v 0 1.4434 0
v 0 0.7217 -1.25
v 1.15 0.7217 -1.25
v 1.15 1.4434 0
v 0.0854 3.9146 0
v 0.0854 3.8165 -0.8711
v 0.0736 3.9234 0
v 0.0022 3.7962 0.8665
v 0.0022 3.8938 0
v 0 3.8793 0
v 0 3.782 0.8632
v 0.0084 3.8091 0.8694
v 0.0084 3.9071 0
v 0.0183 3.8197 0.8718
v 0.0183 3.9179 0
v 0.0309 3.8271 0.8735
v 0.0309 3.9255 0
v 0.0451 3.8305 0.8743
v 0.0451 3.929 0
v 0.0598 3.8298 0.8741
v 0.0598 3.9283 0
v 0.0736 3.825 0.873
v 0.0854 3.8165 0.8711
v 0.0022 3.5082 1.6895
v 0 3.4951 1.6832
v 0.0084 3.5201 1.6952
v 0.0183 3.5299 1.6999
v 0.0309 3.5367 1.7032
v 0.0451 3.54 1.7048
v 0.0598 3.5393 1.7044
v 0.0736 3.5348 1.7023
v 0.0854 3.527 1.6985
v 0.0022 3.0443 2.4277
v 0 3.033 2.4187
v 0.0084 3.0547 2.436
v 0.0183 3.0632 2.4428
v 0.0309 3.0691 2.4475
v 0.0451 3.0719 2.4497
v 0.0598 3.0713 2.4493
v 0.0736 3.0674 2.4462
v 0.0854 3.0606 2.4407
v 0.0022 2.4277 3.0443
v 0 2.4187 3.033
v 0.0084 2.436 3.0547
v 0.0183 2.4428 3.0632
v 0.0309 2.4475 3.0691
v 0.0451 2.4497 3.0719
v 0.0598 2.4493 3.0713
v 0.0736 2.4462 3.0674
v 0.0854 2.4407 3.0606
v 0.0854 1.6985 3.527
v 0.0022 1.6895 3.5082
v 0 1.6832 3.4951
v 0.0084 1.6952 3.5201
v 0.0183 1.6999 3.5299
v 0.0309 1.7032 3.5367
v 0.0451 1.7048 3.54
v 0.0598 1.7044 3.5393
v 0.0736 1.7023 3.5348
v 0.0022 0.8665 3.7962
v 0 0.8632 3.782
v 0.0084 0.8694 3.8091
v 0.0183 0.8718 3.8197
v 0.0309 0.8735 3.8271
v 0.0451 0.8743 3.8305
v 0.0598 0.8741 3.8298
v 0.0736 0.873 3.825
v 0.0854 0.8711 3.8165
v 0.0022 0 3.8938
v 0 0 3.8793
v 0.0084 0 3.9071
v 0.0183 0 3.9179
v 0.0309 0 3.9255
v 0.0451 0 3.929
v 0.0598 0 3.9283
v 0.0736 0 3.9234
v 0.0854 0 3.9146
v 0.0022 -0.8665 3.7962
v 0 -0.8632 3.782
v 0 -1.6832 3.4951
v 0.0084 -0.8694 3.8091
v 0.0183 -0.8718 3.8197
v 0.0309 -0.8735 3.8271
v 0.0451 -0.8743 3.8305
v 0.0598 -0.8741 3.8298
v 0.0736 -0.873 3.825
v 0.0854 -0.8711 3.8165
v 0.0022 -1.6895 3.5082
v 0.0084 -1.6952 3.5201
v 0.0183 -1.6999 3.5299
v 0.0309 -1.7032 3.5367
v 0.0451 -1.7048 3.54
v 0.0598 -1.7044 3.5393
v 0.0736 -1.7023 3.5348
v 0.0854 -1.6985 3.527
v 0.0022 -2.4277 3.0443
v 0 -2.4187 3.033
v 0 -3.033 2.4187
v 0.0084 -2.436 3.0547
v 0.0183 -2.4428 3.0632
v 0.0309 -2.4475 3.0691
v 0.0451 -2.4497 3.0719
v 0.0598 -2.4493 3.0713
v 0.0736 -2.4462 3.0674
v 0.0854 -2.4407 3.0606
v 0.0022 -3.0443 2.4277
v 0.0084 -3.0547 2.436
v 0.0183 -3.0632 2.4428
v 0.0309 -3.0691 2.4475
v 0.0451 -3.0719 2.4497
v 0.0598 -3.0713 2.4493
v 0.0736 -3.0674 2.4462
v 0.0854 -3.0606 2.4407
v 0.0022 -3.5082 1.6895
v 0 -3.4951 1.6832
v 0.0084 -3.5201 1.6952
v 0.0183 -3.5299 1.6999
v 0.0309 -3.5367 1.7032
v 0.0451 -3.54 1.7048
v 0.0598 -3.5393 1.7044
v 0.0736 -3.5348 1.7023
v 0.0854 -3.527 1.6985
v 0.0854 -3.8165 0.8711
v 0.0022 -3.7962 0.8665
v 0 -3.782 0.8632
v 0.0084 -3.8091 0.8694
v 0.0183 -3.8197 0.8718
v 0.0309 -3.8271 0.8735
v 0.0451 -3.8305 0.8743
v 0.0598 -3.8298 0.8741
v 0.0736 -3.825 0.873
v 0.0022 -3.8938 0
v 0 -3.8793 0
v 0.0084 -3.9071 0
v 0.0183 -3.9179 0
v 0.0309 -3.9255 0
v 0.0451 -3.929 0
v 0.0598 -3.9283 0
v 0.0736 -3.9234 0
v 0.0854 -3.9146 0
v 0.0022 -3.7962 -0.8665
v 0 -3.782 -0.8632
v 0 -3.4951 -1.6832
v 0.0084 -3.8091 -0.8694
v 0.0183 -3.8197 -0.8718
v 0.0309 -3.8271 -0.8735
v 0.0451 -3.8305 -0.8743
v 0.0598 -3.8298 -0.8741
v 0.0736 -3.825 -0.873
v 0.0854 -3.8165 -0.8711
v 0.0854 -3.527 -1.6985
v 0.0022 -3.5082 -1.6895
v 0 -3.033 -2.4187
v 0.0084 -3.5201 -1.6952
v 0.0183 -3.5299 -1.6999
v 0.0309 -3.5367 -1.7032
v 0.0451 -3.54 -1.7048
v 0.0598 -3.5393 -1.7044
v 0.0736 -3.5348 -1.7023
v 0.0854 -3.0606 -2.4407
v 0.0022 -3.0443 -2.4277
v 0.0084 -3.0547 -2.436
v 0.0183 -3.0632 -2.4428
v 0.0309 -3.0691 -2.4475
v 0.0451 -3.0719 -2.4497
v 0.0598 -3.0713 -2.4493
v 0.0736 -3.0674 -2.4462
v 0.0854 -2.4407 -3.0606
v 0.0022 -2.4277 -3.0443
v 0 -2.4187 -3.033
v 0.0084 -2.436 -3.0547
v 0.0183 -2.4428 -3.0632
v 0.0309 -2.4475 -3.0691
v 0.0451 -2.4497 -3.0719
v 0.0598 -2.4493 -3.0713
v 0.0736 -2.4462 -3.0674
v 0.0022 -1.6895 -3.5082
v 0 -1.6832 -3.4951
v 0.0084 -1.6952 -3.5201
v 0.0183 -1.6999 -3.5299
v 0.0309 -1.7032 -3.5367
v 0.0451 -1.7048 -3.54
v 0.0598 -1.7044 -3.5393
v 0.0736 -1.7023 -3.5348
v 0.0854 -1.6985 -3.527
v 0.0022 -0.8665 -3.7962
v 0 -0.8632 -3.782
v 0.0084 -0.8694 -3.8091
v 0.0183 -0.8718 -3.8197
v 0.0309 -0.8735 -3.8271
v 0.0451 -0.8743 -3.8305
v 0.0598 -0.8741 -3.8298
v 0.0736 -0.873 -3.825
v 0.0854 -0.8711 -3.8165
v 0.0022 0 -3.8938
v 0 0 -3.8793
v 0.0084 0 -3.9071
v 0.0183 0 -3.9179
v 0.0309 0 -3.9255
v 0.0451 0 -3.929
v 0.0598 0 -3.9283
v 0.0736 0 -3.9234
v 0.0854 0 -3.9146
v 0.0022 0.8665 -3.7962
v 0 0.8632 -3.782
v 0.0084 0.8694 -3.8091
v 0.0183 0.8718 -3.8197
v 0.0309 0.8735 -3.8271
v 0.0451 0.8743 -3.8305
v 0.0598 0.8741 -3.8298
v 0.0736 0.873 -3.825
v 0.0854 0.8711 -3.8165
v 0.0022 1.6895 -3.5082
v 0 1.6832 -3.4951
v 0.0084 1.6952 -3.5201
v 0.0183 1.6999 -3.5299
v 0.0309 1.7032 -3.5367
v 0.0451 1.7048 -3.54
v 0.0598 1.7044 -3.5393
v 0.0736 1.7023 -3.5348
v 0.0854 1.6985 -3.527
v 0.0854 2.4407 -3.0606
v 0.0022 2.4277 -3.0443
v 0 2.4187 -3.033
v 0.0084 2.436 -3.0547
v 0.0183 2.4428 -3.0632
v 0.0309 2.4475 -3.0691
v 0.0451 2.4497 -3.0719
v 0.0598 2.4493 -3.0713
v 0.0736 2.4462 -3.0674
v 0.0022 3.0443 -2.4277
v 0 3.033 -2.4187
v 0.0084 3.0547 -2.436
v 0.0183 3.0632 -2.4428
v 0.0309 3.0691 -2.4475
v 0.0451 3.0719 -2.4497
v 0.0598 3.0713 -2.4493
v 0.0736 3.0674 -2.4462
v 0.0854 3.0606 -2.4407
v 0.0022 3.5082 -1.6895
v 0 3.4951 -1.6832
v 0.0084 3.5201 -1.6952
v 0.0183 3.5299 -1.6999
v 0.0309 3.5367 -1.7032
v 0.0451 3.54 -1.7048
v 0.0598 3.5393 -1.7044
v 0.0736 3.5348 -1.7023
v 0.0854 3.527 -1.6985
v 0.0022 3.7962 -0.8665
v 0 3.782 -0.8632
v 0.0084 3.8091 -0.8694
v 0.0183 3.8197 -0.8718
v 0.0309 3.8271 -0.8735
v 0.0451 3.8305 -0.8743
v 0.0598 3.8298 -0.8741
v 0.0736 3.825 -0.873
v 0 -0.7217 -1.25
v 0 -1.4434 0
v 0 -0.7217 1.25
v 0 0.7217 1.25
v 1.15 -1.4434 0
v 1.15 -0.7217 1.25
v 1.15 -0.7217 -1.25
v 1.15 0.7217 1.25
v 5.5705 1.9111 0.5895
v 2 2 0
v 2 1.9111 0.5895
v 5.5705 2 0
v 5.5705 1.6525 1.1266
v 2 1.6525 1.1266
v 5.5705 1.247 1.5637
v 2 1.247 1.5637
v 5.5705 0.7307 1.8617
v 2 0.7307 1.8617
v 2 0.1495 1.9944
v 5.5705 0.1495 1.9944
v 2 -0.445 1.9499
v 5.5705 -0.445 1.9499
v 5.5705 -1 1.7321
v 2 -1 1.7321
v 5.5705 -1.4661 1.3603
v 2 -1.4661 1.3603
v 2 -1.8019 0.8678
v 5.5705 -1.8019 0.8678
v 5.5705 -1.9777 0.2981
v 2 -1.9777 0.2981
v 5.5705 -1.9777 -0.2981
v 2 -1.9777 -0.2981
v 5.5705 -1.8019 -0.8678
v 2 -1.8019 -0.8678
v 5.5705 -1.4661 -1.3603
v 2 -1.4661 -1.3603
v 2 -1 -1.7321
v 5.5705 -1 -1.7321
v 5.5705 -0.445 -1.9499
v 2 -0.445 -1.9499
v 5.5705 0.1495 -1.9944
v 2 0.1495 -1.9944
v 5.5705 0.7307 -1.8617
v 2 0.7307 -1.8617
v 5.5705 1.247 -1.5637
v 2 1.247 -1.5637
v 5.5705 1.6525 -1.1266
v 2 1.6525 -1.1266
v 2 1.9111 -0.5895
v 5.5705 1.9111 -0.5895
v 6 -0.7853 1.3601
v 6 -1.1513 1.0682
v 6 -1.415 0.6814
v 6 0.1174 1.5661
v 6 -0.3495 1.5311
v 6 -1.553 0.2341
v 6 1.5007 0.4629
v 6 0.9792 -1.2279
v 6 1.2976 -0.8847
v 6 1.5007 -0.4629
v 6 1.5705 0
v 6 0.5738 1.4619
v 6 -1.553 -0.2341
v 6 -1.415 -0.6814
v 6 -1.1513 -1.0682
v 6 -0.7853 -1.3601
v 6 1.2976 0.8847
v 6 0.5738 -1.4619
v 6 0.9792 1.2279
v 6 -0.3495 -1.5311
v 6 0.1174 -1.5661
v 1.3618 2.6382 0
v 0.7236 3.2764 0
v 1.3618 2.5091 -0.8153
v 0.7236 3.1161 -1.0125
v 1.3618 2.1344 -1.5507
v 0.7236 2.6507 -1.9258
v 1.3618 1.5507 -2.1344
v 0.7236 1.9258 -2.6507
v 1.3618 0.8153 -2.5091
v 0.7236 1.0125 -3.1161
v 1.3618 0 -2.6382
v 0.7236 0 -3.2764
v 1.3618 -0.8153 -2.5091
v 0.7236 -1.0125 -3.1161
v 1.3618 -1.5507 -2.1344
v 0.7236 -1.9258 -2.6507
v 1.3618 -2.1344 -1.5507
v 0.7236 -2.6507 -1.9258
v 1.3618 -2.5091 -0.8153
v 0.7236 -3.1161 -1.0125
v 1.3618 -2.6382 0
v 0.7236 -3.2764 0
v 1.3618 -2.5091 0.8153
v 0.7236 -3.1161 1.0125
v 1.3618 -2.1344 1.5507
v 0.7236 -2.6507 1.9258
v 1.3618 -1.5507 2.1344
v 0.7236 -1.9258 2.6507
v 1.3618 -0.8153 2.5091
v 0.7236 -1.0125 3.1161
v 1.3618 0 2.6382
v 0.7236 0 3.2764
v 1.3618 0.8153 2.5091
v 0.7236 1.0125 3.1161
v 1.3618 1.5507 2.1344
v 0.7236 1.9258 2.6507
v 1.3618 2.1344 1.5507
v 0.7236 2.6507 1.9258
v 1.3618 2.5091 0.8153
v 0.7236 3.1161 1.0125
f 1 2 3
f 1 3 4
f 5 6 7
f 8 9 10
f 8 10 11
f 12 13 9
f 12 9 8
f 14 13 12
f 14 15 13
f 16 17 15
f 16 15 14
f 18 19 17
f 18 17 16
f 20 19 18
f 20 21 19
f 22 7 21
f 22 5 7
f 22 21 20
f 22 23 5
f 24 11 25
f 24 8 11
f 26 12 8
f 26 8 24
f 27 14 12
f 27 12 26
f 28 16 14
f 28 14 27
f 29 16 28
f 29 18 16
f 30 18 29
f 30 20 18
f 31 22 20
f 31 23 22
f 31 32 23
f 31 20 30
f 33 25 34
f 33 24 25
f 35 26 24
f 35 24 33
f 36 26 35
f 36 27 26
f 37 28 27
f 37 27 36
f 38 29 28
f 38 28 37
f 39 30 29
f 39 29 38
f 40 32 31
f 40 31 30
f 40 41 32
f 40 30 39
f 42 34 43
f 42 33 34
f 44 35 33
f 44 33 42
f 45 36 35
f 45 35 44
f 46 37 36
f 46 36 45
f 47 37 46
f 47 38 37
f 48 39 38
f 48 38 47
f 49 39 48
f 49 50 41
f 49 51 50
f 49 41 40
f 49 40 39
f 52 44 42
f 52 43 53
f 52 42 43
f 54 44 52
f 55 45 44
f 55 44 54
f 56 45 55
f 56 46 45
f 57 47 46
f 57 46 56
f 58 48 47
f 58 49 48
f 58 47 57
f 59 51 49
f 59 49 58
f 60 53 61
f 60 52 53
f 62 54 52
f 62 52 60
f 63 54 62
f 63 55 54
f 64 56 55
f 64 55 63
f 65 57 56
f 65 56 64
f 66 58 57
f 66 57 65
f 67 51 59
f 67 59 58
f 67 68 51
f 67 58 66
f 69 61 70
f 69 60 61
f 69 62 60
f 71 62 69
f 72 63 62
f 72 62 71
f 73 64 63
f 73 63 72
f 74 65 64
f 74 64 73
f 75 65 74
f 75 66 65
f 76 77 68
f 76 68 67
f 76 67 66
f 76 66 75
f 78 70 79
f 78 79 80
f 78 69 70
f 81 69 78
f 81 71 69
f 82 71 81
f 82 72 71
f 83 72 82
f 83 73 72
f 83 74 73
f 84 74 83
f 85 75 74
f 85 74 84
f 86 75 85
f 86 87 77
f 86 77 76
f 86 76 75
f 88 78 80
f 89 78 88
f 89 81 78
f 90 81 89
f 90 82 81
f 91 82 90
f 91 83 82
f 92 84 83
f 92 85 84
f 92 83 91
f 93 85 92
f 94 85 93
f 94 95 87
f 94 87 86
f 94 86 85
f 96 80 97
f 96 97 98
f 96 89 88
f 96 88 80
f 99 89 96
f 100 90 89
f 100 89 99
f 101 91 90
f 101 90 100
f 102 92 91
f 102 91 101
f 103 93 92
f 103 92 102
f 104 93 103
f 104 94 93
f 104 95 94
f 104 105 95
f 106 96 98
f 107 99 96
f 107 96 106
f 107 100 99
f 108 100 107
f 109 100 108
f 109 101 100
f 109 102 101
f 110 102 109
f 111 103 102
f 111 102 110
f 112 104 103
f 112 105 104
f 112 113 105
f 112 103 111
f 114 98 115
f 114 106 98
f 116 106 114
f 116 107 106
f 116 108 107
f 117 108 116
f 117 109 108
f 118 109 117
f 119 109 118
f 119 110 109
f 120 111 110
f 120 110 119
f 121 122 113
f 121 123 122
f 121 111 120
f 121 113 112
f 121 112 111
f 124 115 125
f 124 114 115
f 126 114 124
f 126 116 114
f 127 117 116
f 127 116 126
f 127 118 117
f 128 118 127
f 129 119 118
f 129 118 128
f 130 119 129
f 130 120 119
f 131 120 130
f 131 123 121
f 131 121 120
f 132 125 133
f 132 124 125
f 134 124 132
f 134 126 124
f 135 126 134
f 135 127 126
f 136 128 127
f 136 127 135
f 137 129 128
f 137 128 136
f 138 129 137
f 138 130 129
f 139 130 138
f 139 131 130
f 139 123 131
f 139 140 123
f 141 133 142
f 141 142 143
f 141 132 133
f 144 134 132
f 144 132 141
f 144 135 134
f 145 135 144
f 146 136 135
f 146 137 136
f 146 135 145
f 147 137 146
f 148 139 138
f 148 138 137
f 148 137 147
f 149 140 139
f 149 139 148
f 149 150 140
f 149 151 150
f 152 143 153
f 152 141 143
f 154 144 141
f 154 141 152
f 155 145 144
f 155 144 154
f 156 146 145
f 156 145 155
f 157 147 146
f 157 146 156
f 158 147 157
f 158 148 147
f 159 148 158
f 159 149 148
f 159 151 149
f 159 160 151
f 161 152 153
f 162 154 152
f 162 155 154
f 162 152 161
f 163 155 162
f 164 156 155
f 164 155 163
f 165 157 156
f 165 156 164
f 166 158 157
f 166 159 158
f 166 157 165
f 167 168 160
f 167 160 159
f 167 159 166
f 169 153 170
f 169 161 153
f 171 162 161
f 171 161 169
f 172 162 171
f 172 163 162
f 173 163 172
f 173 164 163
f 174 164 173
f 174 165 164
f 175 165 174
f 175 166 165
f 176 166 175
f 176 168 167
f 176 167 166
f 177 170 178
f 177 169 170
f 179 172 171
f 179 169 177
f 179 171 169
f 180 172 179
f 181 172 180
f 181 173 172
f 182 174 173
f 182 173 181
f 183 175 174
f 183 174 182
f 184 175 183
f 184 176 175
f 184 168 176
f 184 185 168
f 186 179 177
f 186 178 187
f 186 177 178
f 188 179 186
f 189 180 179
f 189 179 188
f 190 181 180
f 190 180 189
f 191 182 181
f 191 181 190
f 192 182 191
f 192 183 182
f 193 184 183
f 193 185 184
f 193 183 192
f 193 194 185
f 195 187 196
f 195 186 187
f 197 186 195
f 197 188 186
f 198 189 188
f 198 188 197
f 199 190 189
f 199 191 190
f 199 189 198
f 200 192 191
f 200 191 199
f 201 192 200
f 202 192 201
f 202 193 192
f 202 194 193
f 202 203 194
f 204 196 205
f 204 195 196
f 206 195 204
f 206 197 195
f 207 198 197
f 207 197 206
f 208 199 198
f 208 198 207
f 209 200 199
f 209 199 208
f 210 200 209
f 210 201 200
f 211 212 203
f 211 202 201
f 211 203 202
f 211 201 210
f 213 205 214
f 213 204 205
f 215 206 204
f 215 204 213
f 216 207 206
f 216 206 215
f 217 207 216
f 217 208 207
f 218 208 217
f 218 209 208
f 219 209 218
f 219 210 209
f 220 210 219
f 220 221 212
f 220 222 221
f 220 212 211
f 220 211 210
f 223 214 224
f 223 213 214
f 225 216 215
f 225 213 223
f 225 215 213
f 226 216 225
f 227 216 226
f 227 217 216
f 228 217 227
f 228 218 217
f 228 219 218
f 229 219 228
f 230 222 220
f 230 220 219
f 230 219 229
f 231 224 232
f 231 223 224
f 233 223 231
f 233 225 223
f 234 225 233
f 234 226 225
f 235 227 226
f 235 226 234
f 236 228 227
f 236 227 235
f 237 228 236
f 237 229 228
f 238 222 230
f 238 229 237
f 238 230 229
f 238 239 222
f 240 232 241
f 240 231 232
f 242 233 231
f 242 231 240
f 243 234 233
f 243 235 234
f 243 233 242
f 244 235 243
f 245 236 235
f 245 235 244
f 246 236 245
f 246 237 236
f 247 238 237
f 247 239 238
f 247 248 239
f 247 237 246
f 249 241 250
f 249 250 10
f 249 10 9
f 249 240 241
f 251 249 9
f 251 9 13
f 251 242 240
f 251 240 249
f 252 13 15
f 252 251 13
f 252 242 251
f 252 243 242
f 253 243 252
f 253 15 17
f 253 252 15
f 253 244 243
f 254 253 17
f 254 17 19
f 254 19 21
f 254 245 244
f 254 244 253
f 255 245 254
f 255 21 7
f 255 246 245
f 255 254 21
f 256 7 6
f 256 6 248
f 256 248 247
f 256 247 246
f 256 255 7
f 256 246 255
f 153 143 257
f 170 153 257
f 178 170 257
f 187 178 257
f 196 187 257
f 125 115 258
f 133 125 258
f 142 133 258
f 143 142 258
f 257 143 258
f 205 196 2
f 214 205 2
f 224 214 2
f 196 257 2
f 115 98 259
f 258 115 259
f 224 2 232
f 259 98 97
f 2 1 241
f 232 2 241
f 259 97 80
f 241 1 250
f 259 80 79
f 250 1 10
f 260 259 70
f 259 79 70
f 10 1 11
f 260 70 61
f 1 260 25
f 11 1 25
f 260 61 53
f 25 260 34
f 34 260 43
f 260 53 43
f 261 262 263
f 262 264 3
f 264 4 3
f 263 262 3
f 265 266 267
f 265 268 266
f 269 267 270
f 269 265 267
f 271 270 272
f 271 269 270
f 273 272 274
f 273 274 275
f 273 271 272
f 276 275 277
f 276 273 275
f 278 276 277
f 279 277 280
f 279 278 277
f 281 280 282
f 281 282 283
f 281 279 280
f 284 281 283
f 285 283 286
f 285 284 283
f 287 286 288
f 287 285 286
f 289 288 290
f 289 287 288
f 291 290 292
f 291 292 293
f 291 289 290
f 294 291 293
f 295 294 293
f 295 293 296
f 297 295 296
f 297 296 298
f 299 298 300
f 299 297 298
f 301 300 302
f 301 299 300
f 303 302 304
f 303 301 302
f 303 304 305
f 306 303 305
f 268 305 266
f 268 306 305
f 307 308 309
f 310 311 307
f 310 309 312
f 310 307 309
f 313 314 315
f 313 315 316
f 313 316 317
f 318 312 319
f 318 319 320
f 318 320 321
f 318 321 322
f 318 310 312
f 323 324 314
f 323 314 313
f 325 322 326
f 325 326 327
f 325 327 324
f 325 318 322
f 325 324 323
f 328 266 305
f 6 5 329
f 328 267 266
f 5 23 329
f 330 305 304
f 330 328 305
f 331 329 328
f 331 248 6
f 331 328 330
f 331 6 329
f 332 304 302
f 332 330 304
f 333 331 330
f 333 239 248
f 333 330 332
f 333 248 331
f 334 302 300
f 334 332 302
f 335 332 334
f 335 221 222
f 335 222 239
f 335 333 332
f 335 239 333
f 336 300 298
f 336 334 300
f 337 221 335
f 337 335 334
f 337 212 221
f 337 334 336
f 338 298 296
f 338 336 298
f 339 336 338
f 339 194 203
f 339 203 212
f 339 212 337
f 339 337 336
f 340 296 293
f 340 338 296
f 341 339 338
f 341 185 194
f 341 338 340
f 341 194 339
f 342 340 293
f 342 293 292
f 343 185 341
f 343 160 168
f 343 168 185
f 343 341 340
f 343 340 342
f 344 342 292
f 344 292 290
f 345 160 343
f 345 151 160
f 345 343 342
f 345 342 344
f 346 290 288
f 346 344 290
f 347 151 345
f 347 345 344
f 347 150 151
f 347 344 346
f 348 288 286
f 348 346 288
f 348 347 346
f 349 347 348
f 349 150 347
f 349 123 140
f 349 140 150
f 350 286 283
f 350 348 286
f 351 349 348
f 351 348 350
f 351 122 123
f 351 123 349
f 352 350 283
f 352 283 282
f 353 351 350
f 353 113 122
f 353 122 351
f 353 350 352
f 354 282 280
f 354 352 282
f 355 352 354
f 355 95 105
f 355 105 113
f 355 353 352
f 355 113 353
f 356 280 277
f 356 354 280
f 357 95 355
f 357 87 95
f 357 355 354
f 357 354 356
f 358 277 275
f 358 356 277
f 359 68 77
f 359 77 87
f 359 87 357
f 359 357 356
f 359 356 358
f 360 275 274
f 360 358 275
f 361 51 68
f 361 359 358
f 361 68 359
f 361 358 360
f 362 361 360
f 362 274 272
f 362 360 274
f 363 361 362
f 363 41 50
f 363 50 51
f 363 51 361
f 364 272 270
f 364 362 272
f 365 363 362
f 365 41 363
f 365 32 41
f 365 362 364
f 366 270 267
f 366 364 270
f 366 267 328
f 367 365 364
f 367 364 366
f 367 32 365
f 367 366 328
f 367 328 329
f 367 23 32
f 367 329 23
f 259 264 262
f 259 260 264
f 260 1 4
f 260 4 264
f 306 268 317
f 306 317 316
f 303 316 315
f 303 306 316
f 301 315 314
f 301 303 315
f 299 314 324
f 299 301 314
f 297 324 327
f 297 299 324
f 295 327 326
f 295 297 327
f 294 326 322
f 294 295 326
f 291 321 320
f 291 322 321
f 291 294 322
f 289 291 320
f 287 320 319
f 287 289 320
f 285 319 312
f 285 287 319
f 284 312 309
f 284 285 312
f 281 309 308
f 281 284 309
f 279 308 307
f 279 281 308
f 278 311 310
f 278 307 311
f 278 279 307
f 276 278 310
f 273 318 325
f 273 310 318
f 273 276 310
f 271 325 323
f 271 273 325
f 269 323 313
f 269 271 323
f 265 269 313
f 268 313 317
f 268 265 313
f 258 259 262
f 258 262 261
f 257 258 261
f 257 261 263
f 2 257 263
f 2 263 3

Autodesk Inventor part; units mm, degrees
ref_plane "YZ Plane" through (0, 0, 0) normal (1, 0, 0) x (0, 1, 0)
ref_plane "XZ Plane" through (0, 0, 0) normal (0, 1, 0) x (-1, 0, 0)
ref_plane "XY Plane" through (0, 0, 0) normal (0, 0, 1) x (1, 0, 0)
sketch "__1" plane through (0, 0, 0) normal (0, 0, 1) x (1, 0, 0)
  line L0 (56, 0) -> (-56, 0)
  line L1 (0, 0) -> (0, 4)
  line L2 (0, 4) -> (2, 2)
  line L3 (2, 2) -> (5.5705, 2)
  line L4 (5.5705, 2) -> (6, 1.5705)
  line L5 (6, 1.5705) -> (6, 0)
  line L6 (6, 0) -> (0, 0)
revolve "Revolution1" add sketch "__1" angle 360 about axis through (56, 0, 0) along (1, 0, 0)
thread "Thread1" size "M4x0.7" class "6g" standard "ISO Metric profile" length 3.2705
sketch "__2" plane through (0, 0, 0) normal (1, 0, 0) x (0, 0, -1)
  line L0 (-1.25, -0.7217) -> (0, -1.4434)
  line L1 (0, -1.4434) -> (1.25, -0.7217)
  line L2 (1.25, -0.7217) -> (1.25, 0.7217)
  line L3 (1.25, 0.7217) -> (0, 1.4434)
  line L4 (0, 1.4434) -> (-1.25, 0.7217)
  line L5 (-1.25, 0.7217) -> (-1.25, -0.7217)
extrude "Extrusion1" cut sketch "__2" along normal blind 1.15
fillet "Fillet1" radius 0.05 1 edges at (0, -4, 0)
properties part number "FBB4-6" material "Steel"
